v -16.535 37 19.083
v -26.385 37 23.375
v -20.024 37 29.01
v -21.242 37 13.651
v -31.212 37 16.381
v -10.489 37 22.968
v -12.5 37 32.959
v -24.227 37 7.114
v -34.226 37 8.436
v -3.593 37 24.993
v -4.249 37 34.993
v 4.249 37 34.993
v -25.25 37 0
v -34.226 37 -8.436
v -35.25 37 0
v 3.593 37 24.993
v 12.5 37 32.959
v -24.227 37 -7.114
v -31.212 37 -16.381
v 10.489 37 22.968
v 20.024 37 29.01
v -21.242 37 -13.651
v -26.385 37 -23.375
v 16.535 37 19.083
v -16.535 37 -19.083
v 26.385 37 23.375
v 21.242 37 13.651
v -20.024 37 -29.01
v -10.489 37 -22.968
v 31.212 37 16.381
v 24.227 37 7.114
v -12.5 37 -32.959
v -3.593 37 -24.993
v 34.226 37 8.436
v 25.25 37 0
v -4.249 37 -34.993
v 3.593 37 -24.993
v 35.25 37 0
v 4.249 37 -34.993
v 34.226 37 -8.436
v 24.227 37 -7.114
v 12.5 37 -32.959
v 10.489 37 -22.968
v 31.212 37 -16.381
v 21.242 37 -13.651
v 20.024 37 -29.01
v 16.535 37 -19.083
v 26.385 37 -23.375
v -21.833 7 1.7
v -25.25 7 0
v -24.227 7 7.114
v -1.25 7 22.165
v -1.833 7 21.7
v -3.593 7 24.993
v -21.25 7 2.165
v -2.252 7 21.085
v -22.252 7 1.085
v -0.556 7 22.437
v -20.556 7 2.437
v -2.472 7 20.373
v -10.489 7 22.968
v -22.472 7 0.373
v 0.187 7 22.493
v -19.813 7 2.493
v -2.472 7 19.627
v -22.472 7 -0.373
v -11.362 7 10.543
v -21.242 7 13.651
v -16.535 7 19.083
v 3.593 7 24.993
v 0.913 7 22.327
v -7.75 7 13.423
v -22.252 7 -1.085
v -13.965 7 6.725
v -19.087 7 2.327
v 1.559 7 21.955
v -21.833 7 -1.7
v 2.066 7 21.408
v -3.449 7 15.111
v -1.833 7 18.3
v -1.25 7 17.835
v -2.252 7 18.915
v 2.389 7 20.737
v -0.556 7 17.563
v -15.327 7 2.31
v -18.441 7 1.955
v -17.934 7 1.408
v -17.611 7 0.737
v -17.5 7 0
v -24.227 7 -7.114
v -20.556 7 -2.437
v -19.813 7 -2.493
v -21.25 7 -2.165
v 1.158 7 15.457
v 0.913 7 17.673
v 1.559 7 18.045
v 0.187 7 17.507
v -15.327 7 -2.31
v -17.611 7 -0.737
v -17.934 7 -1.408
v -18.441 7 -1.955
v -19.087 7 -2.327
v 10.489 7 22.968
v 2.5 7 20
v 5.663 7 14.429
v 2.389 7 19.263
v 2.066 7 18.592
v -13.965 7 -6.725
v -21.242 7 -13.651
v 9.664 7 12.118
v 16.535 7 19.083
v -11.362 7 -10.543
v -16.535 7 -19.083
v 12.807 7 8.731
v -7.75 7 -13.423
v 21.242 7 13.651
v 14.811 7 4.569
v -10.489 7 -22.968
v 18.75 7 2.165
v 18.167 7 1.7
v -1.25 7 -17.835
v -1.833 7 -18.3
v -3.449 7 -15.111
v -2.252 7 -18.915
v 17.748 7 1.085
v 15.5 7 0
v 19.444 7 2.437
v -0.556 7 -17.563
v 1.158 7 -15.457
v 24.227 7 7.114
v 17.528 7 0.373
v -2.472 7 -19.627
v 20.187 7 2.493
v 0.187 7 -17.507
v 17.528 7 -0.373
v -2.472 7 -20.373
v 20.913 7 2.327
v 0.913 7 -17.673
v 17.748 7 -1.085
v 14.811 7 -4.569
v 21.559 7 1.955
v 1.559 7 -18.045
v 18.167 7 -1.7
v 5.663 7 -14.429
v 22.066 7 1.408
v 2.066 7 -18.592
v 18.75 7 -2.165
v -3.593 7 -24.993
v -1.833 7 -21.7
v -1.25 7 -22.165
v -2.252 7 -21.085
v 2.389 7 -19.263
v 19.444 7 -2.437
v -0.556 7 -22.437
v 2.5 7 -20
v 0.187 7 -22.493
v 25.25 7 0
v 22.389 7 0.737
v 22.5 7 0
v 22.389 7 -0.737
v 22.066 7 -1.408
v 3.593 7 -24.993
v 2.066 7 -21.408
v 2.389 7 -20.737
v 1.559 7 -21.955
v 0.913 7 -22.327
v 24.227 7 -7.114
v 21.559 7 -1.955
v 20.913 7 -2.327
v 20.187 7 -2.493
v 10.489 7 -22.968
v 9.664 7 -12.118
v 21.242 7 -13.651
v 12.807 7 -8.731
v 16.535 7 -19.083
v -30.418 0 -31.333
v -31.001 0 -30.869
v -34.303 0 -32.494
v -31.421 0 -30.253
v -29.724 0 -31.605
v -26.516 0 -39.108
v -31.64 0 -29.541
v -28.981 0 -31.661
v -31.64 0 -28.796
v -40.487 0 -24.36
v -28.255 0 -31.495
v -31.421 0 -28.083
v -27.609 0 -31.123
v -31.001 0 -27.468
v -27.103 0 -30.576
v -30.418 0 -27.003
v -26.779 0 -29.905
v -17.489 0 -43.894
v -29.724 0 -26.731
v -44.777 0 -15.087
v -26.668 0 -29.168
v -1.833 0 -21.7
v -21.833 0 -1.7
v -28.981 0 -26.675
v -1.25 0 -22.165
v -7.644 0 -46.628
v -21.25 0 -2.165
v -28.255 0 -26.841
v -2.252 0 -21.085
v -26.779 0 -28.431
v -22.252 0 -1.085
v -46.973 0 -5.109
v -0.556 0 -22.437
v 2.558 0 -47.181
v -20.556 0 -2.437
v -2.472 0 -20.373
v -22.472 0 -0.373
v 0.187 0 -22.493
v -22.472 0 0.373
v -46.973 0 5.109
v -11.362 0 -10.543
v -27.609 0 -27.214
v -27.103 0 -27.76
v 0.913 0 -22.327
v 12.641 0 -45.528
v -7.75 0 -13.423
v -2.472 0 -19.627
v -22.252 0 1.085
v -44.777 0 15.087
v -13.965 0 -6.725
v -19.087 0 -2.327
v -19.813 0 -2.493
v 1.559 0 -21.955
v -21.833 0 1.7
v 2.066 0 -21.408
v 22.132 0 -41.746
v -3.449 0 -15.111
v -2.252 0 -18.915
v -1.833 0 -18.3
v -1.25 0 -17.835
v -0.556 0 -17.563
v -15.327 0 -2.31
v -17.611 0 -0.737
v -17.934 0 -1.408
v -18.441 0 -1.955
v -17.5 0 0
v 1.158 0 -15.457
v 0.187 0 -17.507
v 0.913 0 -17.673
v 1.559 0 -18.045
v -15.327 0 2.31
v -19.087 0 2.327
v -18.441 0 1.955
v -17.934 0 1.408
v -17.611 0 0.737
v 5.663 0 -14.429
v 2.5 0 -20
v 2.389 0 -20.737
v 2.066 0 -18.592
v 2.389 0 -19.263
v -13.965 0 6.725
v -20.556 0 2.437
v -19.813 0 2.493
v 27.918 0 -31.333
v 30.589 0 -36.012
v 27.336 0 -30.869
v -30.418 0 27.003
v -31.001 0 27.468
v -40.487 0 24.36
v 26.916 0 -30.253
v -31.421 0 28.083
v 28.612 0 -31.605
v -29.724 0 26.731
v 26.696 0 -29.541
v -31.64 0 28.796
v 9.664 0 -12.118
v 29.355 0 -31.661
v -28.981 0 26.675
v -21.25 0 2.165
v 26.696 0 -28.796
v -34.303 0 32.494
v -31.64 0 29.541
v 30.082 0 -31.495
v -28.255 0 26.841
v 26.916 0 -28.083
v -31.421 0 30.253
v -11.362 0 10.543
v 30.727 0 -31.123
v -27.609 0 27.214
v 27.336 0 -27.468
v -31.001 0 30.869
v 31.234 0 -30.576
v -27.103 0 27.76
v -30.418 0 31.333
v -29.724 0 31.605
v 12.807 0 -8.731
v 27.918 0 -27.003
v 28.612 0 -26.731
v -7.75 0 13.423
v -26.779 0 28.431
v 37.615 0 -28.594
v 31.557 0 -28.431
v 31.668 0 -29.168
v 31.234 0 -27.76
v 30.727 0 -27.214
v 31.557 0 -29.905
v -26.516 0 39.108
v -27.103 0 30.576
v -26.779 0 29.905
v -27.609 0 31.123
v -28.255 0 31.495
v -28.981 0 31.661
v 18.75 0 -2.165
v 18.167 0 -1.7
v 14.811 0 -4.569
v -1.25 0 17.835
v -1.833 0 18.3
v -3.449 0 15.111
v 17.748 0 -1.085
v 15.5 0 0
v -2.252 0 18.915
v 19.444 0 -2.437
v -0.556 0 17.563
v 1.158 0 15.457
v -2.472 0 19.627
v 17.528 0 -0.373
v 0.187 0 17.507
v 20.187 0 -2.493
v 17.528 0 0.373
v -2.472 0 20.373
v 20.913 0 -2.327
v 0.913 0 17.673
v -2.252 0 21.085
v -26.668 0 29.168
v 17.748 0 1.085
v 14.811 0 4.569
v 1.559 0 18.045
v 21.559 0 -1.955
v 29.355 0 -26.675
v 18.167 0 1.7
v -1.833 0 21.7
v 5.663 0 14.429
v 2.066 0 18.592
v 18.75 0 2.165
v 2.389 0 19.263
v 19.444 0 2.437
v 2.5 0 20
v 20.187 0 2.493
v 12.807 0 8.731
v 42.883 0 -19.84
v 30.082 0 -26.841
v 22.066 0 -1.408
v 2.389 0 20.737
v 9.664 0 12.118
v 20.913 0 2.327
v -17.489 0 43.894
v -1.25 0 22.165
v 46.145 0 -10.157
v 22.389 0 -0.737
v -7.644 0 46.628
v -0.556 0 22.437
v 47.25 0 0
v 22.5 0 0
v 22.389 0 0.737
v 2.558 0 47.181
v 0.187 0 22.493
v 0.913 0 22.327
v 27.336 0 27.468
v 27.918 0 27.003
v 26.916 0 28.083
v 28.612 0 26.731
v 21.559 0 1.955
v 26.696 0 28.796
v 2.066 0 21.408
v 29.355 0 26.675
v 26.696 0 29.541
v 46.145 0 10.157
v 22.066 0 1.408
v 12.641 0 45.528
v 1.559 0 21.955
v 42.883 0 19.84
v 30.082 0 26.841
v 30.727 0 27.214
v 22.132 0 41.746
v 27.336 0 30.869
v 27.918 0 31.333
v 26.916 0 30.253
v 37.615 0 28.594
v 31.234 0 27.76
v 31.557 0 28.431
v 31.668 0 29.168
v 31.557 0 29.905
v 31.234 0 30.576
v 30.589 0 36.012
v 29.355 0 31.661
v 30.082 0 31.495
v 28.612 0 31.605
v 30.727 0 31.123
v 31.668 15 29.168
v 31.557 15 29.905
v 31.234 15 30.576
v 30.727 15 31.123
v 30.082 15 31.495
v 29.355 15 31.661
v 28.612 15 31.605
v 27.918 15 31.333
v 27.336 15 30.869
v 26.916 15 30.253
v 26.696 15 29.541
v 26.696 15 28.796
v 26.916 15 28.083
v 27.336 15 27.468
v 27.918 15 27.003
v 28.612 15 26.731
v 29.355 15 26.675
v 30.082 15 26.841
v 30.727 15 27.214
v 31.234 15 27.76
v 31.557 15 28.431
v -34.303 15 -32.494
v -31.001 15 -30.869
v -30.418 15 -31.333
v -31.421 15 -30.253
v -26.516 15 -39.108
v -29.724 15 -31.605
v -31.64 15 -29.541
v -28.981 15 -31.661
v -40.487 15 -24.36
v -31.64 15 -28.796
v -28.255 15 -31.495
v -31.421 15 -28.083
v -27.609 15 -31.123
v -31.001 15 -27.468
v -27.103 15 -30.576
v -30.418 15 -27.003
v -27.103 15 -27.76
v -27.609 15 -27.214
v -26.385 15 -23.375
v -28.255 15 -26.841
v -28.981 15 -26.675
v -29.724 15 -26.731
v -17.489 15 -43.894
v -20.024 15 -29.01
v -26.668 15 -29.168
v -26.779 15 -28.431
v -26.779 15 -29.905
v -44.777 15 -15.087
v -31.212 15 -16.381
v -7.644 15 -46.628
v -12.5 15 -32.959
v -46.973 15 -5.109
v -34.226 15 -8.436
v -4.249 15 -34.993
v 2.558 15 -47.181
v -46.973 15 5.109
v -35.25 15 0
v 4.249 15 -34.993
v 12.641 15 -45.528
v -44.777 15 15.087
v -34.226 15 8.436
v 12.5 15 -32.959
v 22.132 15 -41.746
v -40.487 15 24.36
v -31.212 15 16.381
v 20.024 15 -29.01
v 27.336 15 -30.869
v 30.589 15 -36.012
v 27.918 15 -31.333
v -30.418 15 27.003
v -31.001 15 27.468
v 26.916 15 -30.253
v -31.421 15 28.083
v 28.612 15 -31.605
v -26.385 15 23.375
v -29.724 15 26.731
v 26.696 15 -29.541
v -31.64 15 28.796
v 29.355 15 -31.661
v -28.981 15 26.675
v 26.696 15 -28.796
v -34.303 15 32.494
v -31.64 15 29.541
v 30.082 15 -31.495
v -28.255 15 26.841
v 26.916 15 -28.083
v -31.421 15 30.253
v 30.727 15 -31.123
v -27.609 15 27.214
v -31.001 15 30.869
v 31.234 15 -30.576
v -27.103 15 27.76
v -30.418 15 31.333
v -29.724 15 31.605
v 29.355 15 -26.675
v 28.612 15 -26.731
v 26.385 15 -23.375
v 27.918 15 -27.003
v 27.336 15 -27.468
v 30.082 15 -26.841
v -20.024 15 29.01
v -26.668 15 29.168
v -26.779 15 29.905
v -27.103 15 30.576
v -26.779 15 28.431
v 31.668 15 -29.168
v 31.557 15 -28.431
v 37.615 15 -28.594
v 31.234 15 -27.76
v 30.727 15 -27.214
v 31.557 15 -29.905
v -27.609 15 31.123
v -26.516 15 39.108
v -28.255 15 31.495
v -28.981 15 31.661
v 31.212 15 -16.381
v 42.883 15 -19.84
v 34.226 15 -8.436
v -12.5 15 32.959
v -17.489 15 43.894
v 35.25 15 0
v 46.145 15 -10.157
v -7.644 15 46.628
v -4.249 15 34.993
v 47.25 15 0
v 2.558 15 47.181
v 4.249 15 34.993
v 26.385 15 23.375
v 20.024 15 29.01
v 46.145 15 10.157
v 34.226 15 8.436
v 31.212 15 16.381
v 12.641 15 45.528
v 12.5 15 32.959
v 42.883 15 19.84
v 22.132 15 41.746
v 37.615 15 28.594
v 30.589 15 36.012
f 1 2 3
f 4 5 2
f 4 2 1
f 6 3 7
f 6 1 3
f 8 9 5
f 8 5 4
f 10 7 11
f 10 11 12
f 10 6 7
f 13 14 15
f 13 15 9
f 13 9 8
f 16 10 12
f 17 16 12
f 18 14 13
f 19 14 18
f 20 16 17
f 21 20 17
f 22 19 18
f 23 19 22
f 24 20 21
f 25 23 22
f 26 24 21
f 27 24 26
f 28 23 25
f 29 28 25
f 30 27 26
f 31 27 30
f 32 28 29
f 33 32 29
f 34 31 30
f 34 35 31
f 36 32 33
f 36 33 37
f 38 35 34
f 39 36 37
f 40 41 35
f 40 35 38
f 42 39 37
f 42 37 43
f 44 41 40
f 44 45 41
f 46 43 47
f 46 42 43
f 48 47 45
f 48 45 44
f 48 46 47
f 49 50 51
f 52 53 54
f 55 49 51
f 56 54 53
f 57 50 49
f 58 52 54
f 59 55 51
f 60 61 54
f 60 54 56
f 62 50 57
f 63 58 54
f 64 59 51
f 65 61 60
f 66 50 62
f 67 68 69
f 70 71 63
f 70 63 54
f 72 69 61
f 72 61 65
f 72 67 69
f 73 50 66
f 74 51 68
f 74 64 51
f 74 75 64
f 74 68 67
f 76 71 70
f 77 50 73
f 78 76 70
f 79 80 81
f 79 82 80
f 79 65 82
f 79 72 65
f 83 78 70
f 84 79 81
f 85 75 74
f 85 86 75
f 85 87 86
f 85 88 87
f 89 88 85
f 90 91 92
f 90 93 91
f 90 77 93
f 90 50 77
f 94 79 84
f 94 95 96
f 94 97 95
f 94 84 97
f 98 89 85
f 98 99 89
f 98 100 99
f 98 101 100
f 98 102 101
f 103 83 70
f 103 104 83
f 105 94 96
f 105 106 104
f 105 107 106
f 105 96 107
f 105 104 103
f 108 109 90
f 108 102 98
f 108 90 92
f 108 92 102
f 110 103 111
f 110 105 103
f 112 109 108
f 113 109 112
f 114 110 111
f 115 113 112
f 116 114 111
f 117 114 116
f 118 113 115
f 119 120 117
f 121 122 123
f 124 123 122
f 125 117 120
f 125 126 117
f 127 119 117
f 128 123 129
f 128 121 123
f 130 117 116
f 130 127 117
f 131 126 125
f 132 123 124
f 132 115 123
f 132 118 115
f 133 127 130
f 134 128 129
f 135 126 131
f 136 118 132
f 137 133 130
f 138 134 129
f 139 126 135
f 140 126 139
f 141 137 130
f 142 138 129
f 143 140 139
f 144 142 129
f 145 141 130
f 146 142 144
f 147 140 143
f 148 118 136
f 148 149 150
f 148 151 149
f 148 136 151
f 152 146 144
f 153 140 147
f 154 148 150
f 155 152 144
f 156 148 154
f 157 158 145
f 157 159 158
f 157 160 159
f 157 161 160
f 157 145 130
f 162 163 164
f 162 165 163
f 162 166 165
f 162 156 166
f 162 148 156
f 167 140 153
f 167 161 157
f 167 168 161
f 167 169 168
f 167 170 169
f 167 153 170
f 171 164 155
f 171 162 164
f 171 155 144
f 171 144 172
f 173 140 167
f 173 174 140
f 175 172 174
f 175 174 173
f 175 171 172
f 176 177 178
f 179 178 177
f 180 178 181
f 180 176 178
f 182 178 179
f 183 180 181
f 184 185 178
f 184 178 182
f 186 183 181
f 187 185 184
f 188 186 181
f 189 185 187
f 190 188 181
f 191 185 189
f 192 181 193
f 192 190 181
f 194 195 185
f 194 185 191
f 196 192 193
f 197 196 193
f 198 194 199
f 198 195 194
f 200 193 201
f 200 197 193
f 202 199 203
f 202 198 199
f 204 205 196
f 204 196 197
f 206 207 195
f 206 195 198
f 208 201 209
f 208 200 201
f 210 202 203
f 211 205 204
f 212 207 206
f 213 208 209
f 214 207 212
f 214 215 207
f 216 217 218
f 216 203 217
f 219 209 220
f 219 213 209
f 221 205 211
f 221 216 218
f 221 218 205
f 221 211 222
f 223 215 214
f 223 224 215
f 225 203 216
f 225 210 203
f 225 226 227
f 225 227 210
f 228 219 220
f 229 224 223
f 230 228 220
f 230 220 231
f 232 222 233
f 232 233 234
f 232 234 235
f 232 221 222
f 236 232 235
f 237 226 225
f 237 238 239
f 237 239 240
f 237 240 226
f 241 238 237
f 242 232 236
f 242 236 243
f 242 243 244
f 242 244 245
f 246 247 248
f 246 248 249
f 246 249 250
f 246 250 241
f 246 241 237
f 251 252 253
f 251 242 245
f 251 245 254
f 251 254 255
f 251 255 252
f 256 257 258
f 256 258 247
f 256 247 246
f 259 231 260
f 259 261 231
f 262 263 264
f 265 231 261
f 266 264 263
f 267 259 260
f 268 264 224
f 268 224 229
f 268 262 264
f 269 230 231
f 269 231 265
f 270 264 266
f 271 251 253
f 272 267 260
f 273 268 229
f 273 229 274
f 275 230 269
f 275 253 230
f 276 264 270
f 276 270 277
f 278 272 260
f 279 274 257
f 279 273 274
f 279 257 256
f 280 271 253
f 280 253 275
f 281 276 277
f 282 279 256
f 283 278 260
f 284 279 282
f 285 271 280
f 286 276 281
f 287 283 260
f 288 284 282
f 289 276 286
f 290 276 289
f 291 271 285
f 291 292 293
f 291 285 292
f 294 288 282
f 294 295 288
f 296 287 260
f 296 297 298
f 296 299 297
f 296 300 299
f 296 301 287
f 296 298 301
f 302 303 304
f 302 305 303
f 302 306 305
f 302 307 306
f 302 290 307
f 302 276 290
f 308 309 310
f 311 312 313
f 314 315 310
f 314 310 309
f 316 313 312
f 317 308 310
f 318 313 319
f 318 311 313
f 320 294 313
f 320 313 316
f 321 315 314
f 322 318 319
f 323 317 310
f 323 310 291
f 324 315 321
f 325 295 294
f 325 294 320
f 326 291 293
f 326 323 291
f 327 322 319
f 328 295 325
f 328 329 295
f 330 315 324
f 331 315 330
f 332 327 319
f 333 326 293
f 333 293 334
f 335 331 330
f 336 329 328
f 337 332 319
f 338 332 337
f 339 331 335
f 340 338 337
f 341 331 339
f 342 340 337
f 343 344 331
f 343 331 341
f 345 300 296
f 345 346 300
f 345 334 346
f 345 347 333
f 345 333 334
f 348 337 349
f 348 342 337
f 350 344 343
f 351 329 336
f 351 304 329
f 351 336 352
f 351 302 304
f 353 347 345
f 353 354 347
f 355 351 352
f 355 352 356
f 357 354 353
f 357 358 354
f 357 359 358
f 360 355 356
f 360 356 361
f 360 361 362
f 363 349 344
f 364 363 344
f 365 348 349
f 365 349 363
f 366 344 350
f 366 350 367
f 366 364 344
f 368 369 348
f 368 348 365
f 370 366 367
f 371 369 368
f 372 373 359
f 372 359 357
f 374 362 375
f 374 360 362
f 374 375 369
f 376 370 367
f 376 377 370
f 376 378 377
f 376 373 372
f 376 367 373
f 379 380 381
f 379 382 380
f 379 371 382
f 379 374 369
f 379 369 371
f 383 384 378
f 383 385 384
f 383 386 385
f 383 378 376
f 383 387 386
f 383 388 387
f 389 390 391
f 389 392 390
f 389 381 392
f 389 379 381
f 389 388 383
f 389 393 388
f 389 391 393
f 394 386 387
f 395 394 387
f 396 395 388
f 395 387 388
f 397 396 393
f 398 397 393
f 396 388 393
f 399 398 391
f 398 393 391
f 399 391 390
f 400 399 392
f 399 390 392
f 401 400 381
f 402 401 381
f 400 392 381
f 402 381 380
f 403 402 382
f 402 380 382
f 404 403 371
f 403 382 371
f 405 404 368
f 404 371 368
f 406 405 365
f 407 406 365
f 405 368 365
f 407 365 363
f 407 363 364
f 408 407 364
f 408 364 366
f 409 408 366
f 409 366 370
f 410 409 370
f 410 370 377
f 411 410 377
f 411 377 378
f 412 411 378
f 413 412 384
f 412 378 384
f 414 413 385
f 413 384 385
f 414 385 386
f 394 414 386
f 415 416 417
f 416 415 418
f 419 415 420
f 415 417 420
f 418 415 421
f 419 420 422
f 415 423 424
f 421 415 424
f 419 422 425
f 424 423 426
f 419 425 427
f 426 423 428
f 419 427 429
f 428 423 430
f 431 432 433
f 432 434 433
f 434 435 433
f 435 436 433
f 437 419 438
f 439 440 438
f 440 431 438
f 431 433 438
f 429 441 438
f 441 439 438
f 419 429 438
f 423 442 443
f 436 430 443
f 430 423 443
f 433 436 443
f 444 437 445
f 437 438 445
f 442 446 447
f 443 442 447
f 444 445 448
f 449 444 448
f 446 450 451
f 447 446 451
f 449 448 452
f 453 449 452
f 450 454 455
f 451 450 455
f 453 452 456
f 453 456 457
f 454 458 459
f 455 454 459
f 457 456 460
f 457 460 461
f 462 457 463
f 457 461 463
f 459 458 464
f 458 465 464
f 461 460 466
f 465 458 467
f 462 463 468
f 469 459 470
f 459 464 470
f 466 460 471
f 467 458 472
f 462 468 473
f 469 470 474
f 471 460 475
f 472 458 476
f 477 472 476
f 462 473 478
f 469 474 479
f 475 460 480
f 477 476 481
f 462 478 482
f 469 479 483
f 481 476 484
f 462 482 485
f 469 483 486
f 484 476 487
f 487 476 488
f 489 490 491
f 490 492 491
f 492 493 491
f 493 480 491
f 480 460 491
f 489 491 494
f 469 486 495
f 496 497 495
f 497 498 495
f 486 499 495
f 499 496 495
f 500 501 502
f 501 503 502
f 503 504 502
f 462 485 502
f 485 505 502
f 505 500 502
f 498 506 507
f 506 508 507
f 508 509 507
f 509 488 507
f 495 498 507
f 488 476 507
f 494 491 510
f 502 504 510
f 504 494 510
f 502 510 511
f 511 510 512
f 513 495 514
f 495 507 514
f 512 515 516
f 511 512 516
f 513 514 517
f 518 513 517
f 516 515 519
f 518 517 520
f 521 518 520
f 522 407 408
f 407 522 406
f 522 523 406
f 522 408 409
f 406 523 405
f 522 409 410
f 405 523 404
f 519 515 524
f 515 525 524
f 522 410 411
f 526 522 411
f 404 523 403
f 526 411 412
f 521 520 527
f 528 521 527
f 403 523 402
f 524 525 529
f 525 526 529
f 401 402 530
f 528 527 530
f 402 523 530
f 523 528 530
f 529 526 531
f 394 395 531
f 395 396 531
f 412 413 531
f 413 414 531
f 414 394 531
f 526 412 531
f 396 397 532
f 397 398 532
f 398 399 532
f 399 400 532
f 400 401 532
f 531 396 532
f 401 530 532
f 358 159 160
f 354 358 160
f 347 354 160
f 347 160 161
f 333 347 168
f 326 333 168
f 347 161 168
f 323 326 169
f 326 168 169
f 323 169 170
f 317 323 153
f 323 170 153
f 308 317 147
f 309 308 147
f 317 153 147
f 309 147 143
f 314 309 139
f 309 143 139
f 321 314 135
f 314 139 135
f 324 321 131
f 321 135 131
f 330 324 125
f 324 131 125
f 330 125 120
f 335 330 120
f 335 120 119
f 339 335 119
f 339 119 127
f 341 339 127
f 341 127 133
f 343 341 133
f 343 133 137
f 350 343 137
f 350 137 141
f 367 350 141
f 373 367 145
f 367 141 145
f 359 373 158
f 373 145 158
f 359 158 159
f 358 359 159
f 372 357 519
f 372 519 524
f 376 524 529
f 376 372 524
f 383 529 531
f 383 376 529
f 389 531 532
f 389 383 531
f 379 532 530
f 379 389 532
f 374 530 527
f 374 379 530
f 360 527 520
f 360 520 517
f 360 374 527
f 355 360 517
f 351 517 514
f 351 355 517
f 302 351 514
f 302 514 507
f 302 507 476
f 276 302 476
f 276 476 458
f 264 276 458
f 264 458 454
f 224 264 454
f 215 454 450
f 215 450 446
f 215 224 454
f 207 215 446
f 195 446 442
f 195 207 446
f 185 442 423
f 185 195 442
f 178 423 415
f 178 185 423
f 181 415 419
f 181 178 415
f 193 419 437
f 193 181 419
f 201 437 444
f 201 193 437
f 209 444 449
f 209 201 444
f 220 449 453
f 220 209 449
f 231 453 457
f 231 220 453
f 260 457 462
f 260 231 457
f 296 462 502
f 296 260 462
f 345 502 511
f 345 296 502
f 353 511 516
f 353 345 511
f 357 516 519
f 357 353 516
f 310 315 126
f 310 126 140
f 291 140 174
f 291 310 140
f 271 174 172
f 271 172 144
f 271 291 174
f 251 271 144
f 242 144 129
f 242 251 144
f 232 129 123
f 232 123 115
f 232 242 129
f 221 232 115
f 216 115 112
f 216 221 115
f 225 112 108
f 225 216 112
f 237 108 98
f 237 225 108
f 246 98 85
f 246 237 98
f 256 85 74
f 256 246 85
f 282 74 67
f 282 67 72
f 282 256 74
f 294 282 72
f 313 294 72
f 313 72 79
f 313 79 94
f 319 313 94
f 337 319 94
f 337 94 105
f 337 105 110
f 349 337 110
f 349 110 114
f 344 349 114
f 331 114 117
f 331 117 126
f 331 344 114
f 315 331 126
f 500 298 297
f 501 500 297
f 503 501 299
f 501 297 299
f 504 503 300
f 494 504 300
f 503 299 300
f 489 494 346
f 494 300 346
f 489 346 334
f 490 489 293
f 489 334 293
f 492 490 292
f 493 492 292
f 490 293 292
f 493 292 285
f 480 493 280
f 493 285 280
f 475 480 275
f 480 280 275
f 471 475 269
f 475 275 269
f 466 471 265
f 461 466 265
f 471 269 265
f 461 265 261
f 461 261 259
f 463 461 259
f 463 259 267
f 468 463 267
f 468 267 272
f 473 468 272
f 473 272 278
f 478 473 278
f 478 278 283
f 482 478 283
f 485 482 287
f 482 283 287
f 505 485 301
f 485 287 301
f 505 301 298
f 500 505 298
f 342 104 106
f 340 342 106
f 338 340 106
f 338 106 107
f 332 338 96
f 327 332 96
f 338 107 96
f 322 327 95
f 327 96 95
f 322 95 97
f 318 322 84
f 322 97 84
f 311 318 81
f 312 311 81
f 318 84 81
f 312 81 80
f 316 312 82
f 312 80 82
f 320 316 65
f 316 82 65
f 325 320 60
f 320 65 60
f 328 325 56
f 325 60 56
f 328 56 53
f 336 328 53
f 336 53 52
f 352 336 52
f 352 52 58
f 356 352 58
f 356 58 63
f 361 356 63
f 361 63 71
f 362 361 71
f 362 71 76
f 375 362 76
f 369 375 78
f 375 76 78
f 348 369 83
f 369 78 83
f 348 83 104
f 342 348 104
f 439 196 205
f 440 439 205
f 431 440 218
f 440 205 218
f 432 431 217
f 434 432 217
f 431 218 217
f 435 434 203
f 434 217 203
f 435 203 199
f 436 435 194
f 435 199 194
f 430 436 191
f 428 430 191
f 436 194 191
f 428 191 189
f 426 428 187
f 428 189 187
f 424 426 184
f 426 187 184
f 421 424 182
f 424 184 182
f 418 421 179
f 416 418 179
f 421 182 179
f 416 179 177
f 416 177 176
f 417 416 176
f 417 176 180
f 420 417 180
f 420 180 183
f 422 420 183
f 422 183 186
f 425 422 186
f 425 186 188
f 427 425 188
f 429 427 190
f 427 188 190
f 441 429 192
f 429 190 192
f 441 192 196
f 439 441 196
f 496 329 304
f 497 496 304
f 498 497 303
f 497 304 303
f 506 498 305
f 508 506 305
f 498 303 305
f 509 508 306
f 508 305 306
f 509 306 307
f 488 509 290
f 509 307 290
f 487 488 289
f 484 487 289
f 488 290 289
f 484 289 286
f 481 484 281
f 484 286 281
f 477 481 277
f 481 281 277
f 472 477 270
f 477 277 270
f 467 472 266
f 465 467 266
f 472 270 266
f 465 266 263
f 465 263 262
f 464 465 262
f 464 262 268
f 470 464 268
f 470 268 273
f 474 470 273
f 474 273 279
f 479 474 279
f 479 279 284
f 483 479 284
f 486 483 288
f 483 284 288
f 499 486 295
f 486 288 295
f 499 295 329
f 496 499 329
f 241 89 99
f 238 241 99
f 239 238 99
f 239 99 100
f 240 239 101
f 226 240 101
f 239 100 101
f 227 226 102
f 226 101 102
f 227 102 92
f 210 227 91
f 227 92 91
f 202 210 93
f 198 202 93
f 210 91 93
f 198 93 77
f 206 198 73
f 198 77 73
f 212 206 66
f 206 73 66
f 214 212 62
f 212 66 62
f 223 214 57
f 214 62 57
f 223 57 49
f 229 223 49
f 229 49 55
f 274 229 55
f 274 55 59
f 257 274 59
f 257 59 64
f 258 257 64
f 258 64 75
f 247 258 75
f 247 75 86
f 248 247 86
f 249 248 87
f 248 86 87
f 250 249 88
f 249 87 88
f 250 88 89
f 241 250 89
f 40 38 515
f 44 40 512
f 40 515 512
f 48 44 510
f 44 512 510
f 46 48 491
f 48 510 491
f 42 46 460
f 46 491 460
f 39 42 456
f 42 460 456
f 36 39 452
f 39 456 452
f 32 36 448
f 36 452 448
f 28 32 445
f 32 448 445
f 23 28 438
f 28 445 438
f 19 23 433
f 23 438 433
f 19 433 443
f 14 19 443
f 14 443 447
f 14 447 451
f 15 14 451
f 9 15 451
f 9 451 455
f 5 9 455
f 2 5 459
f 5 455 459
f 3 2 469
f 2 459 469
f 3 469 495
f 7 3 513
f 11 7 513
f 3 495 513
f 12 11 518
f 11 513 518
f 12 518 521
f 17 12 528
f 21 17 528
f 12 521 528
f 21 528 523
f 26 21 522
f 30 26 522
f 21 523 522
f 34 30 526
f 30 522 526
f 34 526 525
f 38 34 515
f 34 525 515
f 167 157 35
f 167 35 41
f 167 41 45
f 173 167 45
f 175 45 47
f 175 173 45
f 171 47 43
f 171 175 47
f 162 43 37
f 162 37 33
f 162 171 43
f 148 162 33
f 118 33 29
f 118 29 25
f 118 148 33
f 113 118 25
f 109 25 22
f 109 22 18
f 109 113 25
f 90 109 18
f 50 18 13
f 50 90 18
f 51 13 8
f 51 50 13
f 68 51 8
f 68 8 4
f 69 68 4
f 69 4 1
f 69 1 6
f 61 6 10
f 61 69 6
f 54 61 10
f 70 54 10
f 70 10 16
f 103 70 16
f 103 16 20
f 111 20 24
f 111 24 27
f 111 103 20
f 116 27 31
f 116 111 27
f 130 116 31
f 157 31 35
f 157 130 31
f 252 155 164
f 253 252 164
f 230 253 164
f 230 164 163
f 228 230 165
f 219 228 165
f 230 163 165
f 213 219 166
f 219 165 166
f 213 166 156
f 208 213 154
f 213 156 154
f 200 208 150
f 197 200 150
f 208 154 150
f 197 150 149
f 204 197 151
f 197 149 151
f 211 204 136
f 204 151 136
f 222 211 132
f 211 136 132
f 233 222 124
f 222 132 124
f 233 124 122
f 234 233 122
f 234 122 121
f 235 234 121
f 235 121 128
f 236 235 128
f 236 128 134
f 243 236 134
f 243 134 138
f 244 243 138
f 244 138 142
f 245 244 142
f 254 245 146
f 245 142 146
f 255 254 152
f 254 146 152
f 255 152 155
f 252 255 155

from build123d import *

# Parameters (mm, degrees)
SKETCH1_R           = 35.25
SKETCH1_R_2         = 15.5
BOSS_EXTRUDE1_DEPTH = 7
SKETCH2_R           = 35.25
SKETCH2_R_2         = 25.25
BOSS_EXTRUDE2_DEPTH = 30
SKETCH3_R           = 2.5
CUT_EXTRUDE1_DEPTH  = 7
SKETCH4_R           = 47.25
SKETCH4_R_2         = 35.25
BOSS_EXTRUDE3_DEPTH = 15
SKETCH5_R           = 2.5
CUT_EXTRUDE2_DEPTH  = 15


with BuildPart() as part:
    # Sketch1 → Boss-Extrude1 (new body)
    with BuildSketch(Plane(origin=(0, 0, 0), x_dir=(1, 0, 0), z_dir=(0, 1, 0))):
        Circle(SKETCH1_R)
        Circle(SKETCH1_R_2, mode=Mode.SUBTRACT)
    extrude(amount=BOSS_EXTRUDE1_DEPTH)

    # Sketch2 → Boss-Extrude2 (add)
    with BuildSketch(Plane(origin=(0, 7, 0), x_dir=(1, 0, 0), z_dir=(0, 1, 0))):
        Circle(SKETCH2_R)
        Circle(SKETCH2_R_2, mode=Mode.SUBTRACT)
    extrude(amount=BOSS_EXTRUDE2_DEPTH)

    # Sketch3 → Cut-Extrude1 (cut)
    with BuildSketch(Plane(origin=(0, 7, 0), x_dir=(1, 0, 0), z_dir=(0, 1, 0))):
        with Locations((0, 20)):
            Circle(SKETCH3_R)
        with Locations((20, 0)):
            Circle(SKETCH3_R)
        with Locations((0, -20)):
            Circle(SKETCH3_R)
        with Locations((-20, 0)):
            Circle(SKETCH3_R)
    extrude(amount=-CUT_EXTRUDE1_DEPTH, mode=Mode.SUBTRACT)

    # Sketch4 → Boss-Extrude3 (add)
    with BuildSketch(Plane.XZ):
        Circle(SKETCH4_R)
        Circle(SKETCH4_R_2, mode=Mode.SUBTRACT)
    extrude(amount=-BOSS_EXTRUDE3_DEPTH)

    # Sketch5 → Cut-Extrude2 (cut)
    with BuildSketch(Plane.XZ):
        with Locations((29.168154724, 29.168154724)):
            Circle(SKETCH5_R)
        with Locations((29.168154724, -29.168154724)):
            Circle(SKETCH5_R)
        with Locations((-29.168154724, -29.168154724)):
            Circle(SKETCH5_R)
        with Locations((-29.168154724, 29.168154724)):
            Circle(SKETCH5_R)
    extrude(amount=-CUT_EXTRUDE2_DEPTH, mode=Mode.SUBTRACT)


solid = part.part
